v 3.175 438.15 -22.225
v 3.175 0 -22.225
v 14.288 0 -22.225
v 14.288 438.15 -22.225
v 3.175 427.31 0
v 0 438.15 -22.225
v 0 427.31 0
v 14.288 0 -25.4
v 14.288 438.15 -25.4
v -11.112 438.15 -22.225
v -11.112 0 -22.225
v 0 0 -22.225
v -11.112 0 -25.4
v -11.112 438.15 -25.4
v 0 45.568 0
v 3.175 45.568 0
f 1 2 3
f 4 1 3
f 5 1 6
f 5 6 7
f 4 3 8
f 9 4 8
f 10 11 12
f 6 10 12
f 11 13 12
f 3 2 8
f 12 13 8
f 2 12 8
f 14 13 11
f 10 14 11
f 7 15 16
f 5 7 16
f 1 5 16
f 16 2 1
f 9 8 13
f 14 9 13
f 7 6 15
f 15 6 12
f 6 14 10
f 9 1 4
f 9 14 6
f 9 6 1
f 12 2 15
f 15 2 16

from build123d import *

# Parameters (mm, degrees)
BOSS_EXTRUDE1_DEPTH = 438.15
CUT_EXTRUDE1_DEPTH  = 438.15


with BuildPart() as part:
    # Sketch2 → Boss-Extrude1 (new body)
    with BuildSketch(Plane(origin=(0, 0, 0), x_dir=(1, 0, 0), z_dir=(0, 1, 0))):
        Polygon((0, 0), (3.175, 0), (3.175, 22.225), (14.2875, 22.225), (14.2875, 25.4), (-11.1125, 25.4), (-11.1125, 22.225), (0, 22.225), align=None)
    extrude(amount=BOSS_EXTRUDE1_DEPTH)

    # Sketch4 → Cut-Extrude1 (cut)
    with BuildSketch(Plane(origin=(3.175, 0, 0), x_dir=(0, 0, -1), z_dir=(1, 0, 0))):
        Polygon((22.225, 0), (0, 45.568002879), (0, 0), align=None)
        Polygon((22.225, 438.15), (0, 427.310143219), (0, 438.15), align=None)
    extrude(amount=-CUT_EXTRUDE1_DEPTH, mode=Mode.SUBTRACT)


solid = part.part
